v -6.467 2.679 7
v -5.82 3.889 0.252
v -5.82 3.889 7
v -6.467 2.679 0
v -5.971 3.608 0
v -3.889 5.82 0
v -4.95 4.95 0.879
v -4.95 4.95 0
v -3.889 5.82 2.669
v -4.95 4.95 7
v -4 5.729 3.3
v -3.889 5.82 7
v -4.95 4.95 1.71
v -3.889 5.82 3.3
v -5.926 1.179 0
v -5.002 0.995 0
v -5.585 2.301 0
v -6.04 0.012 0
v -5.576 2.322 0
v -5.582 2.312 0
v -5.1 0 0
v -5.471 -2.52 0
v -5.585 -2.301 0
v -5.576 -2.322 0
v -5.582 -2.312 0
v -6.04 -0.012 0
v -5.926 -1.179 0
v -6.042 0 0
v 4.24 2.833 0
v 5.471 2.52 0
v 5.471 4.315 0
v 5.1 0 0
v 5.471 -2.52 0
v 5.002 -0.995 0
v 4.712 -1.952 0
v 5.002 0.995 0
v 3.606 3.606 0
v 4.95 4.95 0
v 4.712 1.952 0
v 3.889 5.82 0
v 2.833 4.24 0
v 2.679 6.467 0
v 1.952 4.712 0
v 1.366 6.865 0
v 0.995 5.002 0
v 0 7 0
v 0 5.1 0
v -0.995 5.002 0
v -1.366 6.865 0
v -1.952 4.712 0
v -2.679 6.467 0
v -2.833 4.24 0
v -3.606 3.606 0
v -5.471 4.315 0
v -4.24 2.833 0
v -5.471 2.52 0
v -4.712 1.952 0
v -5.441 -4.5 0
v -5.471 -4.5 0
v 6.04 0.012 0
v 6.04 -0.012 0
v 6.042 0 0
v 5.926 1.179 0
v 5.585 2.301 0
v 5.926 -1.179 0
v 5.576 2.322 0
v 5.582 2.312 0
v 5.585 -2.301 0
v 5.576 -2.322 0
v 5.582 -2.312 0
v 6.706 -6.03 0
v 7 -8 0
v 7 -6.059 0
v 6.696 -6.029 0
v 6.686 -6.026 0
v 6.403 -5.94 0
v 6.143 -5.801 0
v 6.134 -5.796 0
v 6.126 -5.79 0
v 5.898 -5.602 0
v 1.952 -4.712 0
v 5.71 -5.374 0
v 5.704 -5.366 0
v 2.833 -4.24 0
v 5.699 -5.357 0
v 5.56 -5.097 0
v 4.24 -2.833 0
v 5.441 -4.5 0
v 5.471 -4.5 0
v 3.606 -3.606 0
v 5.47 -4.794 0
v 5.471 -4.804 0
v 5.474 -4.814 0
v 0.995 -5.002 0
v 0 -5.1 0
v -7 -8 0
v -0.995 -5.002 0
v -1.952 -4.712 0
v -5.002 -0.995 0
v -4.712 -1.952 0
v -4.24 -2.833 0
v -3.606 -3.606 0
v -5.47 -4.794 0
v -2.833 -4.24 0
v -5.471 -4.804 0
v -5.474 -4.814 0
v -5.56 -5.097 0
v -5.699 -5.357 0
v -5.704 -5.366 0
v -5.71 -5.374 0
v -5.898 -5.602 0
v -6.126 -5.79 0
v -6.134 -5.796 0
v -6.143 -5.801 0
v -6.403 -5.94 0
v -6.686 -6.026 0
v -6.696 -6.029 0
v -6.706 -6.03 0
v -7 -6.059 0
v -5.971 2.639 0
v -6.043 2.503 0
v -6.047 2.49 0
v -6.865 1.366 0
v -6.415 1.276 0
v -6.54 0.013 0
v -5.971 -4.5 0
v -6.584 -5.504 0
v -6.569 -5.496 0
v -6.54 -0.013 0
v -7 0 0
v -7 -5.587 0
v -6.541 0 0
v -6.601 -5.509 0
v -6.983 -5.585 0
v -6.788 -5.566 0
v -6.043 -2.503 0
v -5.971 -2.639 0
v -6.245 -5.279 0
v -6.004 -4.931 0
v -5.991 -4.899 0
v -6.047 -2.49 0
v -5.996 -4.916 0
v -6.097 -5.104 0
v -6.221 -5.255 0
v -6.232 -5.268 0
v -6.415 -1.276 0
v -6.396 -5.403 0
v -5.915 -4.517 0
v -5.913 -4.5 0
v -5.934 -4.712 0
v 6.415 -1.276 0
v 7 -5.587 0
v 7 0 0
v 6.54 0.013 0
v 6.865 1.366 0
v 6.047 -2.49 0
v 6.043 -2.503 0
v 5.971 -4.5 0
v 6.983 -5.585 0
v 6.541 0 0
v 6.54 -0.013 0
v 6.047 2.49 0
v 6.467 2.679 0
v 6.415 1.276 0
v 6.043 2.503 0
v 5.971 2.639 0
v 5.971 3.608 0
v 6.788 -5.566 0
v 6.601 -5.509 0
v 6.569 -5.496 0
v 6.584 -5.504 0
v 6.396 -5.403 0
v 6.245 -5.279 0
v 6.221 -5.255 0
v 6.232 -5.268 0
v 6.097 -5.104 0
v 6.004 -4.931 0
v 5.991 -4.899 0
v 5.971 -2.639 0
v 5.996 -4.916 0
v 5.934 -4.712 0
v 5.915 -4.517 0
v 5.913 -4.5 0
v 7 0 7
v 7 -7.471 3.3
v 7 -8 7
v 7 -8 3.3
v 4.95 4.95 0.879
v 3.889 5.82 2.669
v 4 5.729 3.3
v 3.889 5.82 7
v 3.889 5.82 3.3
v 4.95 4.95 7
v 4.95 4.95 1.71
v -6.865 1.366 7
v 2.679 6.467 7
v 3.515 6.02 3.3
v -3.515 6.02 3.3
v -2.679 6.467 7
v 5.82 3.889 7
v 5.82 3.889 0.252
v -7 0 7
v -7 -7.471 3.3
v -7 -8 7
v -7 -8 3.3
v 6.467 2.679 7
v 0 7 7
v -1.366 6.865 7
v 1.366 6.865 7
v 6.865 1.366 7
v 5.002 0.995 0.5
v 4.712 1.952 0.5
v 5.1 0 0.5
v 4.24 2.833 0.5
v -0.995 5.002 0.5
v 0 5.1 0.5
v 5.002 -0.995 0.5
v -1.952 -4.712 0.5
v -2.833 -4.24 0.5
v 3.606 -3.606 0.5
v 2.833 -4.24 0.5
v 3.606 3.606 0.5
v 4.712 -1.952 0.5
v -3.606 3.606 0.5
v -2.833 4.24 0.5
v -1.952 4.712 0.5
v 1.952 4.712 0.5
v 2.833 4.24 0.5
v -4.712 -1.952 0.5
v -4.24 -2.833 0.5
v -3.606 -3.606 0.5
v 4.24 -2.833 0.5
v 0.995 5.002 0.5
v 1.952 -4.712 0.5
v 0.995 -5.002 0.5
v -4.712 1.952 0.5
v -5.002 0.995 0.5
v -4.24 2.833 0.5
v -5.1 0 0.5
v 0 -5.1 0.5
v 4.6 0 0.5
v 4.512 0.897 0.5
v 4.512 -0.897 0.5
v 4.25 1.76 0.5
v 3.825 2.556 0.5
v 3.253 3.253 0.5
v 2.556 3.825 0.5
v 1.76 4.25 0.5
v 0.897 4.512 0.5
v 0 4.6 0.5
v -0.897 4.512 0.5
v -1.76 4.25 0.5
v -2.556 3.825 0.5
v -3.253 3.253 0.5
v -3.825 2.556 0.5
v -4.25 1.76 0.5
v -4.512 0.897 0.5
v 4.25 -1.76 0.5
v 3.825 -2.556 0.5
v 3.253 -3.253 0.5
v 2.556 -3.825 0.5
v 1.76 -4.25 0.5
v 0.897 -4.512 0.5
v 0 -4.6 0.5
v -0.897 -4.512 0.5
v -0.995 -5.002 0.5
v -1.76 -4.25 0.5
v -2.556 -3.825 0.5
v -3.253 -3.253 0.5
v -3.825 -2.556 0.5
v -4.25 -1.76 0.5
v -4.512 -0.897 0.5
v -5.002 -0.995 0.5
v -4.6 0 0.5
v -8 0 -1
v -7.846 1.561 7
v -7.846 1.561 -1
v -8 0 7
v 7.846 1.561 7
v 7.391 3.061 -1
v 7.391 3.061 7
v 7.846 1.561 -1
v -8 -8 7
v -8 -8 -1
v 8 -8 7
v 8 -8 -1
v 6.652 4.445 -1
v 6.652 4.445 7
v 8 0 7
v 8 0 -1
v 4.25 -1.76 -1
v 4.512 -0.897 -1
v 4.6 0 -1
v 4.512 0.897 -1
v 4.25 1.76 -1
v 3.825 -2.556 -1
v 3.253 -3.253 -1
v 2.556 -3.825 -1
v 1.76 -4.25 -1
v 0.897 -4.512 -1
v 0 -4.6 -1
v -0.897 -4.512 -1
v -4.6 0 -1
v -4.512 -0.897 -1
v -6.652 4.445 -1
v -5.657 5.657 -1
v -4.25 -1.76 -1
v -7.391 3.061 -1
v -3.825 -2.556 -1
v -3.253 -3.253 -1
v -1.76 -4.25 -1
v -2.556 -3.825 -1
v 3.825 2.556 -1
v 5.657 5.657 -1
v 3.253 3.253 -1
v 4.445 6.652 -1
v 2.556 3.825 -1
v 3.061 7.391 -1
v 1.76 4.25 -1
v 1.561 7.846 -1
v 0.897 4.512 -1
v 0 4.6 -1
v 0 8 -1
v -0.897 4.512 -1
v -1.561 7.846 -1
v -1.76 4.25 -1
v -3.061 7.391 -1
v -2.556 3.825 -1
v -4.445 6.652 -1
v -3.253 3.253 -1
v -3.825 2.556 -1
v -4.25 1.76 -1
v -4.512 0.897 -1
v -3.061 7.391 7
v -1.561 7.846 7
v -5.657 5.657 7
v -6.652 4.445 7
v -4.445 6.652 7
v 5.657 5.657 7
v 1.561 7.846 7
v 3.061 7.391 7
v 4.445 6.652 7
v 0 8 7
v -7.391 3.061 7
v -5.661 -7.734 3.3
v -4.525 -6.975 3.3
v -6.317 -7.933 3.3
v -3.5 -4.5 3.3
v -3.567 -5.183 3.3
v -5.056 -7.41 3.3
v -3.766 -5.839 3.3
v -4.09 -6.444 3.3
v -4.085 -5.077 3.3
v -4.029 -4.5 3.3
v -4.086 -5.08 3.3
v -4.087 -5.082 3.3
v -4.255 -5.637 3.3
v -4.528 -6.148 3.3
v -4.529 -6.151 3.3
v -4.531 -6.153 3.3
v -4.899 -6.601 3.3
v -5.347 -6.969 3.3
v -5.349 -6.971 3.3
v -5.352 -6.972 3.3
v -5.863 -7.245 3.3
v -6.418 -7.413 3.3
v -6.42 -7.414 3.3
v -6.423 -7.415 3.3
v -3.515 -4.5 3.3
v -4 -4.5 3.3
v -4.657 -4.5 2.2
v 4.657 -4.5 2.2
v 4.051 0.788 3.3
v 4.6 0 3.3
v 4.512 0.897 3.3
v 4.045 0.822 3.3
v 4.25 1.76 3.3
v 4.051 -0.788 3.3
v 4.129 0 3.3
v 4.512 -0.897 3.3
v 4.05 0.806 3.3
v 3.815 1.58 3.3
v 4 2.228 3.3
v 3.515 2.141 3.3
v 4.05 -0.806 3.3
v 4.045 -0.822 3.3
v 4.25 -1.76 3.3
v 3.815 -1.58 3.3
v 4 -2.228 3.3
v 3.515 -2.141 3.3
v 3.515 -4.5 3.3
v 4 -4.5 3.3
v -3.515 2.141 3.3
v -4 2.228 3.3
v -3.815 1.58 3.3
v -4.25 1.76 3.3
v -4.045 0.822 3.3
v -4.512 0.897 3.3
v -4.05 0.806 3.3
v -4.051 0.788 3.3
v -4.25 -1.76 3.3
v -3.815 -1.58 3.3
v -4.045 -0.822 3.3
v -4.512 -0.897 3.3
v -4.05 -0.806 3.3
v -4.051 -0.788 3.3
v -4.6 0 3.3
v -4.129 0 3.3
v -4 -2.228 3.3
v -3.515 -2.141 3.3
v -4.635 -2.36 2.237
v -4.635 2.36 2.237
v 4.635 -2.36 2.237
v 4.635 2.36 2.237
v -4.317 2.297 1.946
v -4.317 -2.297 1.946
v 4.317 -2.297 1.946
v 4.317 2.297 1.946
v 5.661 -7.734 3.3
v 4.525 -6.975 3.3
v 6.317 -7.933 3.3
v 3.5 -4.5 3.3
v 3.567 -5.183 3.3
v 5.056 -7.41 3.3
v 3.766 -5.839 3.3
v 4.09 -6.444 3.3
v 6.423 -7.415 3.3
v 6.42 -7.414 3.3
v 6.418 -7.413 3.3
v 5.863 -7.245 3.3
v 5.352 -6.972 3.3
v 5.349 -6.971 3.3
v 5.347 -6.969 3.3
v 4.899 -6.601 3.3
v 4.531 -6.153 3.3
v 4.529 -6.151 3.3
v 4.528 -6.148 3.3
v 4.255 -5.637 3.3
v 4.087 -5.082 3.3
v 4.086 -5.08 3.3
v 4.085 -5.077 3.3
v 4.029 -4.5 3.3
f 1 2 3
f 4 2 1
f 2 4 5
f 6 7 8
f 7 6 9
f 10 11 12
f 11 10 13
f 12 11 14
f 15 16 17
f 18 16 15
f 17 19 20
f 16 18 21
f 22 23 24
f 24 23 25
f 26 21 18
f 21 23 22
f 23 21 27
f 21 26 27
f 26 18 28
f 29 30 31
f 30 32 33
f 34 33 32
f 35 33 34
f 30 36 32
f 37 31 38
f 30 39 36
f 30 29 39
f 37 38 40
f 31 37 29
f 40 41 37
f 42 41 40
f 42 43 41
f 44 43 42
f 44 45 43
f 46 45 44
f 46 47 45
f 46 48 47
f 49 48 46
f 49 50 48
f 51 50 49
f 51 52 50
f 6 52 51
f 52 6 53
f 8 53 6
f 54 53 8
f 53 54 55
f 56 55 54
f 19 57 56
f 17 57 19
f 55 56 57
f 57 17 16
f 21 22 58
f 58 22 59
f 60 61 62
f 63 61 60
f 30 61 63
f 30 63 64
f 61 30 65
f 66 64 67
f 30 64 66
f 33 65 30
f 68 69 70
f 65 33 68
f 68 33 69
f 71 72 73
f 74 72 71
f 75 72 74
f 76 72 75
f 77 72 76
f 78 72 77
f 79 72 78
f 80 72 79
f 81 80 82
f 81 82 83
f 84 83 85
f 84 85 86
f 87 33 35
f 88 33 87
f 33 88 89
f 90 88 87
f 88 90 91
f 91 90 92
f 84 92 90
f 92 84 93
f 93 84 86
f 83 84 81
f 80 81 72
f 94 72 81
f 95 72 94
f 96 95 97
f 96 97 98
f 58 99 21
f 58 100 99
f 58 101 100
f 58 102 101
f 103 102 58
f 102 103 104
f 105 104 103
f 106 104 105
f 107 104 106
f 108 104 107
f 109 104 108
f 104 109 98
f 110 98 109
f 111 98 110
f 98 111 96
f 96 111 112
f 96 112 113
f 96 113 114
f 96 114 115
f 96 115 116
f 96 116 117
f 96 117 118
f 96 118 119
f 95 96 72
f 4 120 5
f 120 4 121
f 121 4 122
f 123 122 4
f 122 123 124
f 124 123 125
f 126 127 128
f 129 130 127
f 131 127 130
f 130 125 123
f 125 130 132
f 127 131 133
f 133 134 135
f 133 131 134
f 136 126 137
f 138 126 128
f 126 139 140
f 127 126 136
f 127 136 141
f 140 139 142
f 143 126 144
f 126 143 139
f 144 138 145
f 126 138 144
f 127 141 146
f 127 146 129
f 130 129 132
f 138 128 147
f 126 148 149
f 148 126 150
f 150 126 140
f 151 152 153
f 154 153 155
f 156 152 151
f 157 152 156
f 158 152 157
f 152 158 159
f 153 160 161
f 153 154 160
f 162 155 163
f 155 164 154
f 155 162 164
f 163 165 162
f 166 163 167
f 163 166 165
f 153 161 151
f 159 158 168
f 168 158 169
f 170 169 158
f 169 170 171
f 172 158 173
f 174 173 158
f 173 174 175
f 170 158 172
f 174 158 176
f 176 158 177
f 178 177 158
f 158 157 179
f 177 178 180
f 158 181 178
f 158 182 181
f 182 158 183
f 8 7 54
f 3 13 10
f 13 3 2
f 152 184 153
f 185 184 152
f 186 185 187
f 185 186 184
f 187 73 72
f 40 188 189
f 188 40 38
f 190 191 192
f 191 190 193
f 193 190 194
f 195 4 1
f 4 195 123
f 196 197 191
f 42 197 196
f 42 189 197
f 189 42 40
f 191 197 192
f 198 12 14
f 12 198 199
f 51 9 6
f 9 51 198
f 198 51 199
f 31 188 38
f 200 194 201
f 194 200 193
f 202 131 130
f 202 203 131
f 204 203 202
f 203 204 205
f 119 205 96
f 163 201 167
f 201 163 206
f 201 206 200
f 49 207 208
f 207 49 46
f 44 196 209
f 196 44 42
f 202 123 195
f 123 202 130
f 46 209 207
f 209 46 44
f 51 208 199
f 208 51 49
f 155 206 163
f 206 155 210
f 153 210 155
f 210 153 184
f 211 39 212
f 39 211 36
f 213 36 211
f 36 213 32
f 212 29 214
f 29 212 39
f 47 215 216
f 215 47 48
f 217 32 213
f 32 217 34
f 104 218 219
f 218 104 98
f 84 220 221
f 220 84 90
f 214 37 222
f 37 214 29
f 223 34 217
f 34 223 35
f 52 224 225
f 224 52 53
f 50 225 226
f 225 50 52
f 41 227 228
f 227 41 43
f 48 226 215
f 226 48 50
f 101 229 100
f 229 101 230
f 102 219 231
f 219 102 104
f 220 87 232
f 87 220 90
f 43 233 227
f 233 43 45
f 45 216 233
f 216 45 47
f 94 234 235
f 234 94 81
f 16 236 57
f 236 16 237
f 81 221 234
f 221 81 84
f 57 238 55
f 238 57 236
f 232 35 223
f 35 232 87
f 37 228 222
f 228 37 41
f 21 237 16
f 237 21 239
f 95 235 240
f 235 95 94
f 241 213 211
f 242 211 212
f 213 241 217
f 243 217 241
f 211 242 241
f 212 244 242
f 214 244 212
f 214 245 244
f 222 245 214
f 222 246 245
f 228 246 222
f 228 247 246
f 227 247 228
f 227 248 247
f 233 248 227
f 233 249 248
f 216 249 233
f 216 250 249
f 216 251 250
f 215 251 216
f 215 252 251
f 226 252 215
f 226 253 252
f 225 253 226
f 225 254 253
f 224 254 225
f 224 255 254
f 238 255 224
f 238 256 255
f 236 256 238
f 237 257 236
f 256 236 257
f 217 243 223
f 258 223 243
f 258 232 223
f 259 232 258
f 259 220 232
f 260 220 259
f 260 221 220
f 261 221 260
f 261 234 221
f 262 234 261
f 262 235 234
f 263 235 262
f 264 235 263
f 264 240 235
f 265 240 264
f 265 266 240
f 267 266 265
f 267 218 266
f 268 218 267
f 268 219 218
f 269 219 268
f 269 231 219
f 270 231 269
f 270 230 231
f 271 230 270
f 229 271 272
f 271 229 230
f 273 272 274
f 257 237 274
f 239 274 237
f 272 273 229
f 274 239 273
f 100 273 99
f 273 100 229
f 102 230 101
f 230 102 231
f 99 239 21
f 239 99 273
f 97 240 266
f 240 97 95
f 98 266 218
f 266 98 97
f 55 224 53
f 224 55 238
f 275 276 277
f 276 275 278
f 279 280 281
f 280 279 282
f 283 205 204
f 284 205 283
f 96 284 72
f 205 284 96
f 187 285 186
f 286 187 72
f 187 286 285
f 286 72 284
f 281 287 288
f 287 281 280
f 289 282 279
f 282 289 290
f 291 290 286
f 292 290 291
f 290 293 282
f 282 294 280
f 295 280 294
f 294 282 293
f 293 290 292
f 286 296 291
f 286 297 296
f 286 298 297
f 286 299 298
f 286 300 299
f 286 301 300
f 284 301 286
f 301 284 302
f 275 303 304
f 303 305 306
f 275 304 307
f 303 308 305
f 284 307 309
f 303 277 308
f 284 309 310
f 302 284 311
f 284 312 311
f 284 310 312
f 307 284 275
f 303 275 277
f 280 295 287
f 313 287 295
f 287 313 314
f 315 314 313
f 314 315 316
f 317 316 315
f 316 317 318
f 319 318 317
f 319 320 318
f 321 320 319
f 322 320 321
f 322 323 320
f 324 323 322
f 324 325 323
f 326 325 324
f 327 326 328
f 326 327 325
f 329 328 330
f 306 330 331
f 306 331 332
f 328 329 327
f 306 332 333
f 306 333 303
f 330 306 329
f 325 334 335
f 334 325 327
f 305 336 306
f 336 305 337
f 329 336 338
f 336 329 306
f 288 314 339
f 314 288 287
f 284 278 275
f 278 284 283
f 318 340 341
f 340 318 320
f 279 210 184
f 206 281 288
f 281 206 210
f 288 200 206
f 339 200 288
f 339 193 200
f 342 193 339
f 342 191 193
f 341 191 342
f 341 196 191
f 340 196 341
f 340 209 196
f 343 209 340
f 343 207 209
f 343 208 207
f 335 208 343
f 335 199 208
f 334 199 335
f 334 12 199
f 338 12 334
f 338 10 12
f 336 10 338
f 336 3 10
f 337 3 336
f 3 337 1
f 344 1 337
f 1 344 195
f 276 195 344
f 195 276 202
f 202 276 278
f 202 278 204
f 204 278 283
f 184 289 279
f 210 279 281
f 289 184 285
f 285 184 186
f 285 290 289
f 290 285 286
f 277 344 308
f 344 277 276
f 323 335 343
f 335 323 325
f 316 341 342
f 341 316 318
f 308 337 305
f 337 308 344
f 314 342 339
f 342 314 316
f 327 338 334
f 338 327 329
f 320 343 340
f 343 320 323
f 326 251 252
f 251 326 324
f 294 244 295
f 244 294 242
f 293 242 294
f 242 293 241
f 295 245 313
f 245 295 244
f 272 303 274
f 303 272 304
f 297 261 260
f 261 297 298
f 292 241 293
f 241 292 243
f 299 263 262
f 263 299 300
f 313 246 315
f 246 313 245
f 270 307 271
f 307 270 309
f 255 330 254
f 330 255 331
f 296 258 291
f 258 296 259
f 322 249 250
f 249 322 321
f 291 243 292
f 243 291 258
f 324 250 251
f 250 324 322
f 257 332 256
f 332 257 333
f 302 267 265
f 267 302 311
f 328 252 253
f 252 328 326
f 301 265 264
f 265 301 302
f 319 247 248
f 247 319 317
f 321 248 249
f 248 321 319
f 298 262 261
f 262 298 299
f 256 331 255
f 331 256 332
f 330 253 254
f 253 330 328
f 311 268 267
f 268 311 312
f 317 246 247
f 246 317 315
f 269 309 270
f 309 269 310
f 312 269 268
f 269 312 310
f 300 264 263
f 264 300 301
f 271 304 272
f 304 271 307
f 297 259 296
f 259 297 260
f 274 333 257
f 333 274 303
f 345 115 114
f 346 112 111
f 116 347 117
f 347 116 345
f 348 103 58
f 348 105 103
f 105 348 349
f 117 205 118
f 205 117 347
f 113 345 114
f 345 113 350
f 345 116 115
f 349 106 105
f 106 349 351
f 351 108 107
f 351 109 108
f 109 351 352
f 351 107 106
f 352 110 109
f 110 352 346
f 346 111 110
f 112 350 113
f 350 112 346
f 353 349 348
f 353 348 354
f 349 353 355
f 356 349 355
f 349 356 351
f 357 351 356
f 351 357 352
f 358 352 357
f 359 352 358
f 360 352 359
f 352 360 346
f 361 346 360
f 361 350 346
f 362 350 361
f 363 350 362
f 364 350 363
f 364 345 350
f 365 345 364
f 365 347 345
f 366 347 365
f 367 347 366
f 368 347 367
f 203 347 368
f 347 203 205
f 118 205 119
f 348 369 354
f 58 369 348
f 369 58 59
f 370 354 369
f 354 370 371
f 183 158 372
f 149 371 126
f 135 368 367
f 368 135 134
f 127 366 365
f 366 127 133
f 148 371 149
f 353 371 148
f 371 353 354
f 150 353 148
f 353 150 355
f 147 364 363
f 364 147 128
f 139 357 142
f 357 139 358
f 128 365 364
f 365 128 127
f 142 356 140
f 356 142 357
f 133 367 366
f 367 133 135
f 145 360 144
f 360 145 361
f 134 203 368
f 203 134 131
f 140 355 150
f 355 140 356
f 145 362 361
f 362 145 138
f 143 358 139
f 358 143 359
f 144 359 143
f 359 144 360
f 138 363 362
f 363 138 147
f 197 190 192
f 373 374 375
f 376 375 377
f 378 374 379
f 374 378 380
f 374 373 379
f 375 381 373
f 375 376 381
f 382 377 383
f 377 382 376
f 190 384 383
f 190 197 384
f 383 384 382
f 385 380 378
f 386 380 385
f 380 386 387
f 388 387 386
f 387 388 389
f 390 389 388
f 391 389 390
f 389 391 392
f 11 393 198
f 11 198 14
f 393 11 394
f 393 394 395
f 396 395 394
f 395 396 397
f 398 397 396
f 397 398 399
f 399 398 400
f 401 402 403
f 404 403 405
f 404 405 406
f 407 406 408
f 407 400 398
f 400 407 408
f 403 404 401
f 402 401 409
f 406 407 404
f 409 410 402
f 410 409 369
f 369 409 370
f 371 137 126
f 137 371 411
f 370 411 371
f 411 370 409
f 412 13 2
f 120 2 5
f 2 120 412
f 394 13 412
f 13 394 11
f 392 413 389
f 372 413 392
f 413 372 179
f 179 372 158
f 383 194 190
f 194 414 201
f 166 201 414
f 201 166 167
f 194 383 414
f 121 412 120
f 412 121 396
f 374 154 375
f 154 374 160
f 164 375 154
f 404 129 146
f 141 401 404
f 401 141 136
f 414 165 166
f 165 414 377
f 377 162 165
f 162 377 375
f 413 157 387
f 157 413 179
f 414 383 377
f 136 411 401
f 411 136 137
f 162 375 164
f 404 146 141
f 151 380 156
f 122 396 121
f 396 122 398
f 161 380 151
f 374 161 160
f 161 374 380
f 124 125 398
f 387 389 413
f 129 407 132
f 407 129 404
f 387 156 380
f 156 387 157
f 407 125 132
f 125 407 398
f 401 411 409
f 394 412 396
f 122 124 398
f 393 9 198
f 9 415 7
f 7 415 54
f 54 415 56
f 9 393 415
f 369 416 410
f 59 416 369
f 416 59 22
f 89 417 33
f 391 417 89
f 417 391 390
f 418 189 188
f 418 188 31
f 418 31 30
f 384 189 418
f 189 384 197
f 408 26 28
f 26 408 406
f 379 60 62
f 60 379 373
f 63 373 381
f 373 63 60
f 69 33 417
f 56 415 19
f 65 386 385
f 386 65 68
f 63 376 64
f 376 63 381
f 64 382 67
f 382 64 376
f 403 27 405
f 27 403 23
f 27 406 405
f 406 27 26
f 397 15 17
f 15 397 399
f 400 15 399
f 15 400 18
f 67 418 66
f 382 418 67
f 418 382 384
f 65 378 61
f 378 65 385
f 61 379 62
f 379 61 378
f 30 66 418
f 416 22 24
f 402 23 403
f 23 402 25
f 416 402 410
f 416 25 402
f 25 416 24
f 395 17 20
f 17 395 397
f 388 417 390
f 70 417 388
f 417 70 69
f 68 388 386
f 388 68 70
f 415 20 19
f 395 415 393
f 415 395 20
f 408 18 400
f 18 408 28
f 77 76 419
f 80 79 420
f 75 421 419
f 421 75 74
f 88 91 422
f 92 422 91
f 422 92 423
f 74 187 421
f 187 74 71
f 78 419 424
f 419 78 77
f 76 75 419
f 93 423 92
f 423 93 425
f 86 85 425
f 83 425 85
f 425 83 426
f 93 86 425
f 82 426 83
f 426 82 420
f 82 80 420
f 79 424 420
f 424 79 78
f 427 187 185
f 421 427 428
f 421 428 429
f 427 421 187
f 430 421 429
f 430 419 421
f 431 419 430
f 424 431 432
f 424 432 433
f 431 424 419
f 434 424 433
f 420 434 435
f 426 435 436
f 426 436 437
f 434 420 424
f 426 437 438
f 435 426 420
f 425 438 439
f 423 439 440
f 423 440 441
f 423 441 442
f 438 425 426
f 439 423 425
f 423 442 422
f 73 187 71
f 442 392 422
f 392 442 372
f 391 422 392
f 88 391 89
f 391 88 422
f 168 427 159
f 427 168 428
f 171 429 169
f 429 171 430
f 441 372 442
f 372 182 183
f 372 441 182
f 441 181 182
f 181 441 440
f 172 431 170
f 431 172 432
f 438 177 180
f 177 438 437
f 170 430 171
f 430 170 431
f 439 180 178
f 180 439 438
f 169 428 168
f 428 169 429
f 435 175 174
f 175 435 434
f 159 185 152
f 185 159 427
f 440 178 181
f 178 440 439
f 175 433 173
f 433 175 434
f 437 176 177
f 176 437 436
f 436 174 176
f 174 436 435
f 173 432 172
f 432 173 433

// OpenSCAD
use <utilities.scad>;

$fn=32;
d=0.05;

tube_lens_r=5+0.1;
tube_lens_edge_h=2;
tube_lens_centre_h=4;
gripper_t=1;

body_r=8;
inner_r=body_r-1;
cutout_h=tube_lens_centre_h+1;
roof_r = inner_r-cutout_h+tube_lens_edge_h;
floor_t = 1;

pedestal_h=0.5;
        
module body(){
    union(){
        difference(){
            //body
            translate([0,0,-floor_t]) hull(){
                cylinder(r=body_r,h=body_r);
                translate([-body_r,-body_r,0]) cube([2*body_r,body_r,body_r]);
            }
            difference(){
                hull(){
                    translate([0,0,0]) cylinder(r=7,h=999);
                    translate([-7,-9,0]) cube([14,7,999]);
                }
                //the lens sits on a little pedestal
                translate([0,0,-d]) cylinder(r=tube_lens_r,h=d+pedestal_h);
            }
            //beam clearance
            cylinder(r=tube_lens_r-0.5,h=999,center=true);
            
            //indent and hole for lens
            translate([0,0,0.5]) cylinder(r1=tube_lens_r,r2=tube_lens_r+0.5,h=1);
            translate([0,0,-d]) cylinder(r=tube_lens_r-0.5,h=1);
            
            //relief so it can slide in without scratches
            translate([-tube_lens_r+1,-6,1]) cube([tube_lens_r*2-2,6,0.5]); 
            
        }
        
        //gripper
//        module gripper_post(){
//            x_squash=1;
//            dy=3
//            hull(){
//                translate([0,0,-d]) cylinder(r=0.25,h=d);
//                translate([top_r-0.25,0,]) cylinder(r=0.25,h=d);
        m=1.7; //gradient of wall
        tightness=0.5; //how much the lens is squeezed in position
        transient_tightness=0.6; //how much the lens is squeezed on the way in
        bottom_r=tube_lens_r + (tube_lens_edge_h+pedestal_h)/m -tightness;
        //distance of the bottom of the wall from the edge of the cavity
        gripper_h=tube_lens_edge_h+pedestal_h+m*0.5; //height of the gripper "wall"
        dr=gripper_h/m; //distance of top of wall from cavity edge
        reflect([1,0,0]){
            f_bottom_r = inner_r - bottom_r + transient_tightness;
            translate([-inner_r,-body_r+f_bottom_r+dr,-d]) difference(){
                intersection(){
                    cylinder(r1=f_bottom_r,r2=f_bottom_r+dr, h=gripper_h);
                    rotate(-90) cube(999);
                }
                translate([0,0,-d]) cylinder(r1=f_bottom_r-0.5,
                         r2=f_bottom_r+dr-0.5, h=gripper_h+2*d);
            }
            intersection(){
                //side wall grippers, incl. rounded bit
                translate([0,0,-floor_t]) cylinder(r=body_r,h=body_r);
                difference(){
                    union(){
                        translate([0,f_bottom_r+dr,-d]) hull(){
                            cube([(bottom_r-transient_tightness)*2+1,2*body_r,2*d],center=true);
                            cube([(bottom_r-transient_tightness-dr)*2+1,2*body_r,2*gripper_h],center=true);
                        }
                        translate([0,0,-d]) cylinder(r1=bottom_r+0.5, r2=bottom_r+0.5+-dr, h=gripper_h);
                    }
                    union(){
                        translate([0,f_bottom_r+dr,-d]) hull(){
                            cube([(bottom_r-transient_tightness)*2,999,2*d],center=true);
                            cube([(bottom_r-transient_tightness-dr)*2,999,2*gripper_h+d],center=true);
                        }
                        translate([0,0,-d]) cylinder(r1=bottom_r, r2=bottom_r+-dr, h=gripper_h+d);
                    }
                }
            }
//            intersection(){
//                cylinder(r=inner_r+d,h=999);
//                hull(){
//                    translate([-7+top_r-0.5,-tube_lens_r+1-d,1.25+tube_lens_edge_h+1-d]) cube([0.5,999,d]);
//                    translate([-7+top_r-0.5-tube_lens_edge_h/2,-tube_lens_r+1-d,1.25-d]) cube([0.5,999,d]);
//                }
//            }
        }
    }
}
module lens() {
    intersection(){
        dh=tube_lens_centre_h-tube_lens_edge_h;
        rs=(pow(dh,2) + pow(tube_lens_r,2))/(2*dh);
        cylinder(r=tube_lens_r,h=999);
        translate([0,0,tube_lens_centre_h-rs]) sphere(r=rs);
    }
}

//gripper();
body();

%translate([0,0,0.5]) lens();
